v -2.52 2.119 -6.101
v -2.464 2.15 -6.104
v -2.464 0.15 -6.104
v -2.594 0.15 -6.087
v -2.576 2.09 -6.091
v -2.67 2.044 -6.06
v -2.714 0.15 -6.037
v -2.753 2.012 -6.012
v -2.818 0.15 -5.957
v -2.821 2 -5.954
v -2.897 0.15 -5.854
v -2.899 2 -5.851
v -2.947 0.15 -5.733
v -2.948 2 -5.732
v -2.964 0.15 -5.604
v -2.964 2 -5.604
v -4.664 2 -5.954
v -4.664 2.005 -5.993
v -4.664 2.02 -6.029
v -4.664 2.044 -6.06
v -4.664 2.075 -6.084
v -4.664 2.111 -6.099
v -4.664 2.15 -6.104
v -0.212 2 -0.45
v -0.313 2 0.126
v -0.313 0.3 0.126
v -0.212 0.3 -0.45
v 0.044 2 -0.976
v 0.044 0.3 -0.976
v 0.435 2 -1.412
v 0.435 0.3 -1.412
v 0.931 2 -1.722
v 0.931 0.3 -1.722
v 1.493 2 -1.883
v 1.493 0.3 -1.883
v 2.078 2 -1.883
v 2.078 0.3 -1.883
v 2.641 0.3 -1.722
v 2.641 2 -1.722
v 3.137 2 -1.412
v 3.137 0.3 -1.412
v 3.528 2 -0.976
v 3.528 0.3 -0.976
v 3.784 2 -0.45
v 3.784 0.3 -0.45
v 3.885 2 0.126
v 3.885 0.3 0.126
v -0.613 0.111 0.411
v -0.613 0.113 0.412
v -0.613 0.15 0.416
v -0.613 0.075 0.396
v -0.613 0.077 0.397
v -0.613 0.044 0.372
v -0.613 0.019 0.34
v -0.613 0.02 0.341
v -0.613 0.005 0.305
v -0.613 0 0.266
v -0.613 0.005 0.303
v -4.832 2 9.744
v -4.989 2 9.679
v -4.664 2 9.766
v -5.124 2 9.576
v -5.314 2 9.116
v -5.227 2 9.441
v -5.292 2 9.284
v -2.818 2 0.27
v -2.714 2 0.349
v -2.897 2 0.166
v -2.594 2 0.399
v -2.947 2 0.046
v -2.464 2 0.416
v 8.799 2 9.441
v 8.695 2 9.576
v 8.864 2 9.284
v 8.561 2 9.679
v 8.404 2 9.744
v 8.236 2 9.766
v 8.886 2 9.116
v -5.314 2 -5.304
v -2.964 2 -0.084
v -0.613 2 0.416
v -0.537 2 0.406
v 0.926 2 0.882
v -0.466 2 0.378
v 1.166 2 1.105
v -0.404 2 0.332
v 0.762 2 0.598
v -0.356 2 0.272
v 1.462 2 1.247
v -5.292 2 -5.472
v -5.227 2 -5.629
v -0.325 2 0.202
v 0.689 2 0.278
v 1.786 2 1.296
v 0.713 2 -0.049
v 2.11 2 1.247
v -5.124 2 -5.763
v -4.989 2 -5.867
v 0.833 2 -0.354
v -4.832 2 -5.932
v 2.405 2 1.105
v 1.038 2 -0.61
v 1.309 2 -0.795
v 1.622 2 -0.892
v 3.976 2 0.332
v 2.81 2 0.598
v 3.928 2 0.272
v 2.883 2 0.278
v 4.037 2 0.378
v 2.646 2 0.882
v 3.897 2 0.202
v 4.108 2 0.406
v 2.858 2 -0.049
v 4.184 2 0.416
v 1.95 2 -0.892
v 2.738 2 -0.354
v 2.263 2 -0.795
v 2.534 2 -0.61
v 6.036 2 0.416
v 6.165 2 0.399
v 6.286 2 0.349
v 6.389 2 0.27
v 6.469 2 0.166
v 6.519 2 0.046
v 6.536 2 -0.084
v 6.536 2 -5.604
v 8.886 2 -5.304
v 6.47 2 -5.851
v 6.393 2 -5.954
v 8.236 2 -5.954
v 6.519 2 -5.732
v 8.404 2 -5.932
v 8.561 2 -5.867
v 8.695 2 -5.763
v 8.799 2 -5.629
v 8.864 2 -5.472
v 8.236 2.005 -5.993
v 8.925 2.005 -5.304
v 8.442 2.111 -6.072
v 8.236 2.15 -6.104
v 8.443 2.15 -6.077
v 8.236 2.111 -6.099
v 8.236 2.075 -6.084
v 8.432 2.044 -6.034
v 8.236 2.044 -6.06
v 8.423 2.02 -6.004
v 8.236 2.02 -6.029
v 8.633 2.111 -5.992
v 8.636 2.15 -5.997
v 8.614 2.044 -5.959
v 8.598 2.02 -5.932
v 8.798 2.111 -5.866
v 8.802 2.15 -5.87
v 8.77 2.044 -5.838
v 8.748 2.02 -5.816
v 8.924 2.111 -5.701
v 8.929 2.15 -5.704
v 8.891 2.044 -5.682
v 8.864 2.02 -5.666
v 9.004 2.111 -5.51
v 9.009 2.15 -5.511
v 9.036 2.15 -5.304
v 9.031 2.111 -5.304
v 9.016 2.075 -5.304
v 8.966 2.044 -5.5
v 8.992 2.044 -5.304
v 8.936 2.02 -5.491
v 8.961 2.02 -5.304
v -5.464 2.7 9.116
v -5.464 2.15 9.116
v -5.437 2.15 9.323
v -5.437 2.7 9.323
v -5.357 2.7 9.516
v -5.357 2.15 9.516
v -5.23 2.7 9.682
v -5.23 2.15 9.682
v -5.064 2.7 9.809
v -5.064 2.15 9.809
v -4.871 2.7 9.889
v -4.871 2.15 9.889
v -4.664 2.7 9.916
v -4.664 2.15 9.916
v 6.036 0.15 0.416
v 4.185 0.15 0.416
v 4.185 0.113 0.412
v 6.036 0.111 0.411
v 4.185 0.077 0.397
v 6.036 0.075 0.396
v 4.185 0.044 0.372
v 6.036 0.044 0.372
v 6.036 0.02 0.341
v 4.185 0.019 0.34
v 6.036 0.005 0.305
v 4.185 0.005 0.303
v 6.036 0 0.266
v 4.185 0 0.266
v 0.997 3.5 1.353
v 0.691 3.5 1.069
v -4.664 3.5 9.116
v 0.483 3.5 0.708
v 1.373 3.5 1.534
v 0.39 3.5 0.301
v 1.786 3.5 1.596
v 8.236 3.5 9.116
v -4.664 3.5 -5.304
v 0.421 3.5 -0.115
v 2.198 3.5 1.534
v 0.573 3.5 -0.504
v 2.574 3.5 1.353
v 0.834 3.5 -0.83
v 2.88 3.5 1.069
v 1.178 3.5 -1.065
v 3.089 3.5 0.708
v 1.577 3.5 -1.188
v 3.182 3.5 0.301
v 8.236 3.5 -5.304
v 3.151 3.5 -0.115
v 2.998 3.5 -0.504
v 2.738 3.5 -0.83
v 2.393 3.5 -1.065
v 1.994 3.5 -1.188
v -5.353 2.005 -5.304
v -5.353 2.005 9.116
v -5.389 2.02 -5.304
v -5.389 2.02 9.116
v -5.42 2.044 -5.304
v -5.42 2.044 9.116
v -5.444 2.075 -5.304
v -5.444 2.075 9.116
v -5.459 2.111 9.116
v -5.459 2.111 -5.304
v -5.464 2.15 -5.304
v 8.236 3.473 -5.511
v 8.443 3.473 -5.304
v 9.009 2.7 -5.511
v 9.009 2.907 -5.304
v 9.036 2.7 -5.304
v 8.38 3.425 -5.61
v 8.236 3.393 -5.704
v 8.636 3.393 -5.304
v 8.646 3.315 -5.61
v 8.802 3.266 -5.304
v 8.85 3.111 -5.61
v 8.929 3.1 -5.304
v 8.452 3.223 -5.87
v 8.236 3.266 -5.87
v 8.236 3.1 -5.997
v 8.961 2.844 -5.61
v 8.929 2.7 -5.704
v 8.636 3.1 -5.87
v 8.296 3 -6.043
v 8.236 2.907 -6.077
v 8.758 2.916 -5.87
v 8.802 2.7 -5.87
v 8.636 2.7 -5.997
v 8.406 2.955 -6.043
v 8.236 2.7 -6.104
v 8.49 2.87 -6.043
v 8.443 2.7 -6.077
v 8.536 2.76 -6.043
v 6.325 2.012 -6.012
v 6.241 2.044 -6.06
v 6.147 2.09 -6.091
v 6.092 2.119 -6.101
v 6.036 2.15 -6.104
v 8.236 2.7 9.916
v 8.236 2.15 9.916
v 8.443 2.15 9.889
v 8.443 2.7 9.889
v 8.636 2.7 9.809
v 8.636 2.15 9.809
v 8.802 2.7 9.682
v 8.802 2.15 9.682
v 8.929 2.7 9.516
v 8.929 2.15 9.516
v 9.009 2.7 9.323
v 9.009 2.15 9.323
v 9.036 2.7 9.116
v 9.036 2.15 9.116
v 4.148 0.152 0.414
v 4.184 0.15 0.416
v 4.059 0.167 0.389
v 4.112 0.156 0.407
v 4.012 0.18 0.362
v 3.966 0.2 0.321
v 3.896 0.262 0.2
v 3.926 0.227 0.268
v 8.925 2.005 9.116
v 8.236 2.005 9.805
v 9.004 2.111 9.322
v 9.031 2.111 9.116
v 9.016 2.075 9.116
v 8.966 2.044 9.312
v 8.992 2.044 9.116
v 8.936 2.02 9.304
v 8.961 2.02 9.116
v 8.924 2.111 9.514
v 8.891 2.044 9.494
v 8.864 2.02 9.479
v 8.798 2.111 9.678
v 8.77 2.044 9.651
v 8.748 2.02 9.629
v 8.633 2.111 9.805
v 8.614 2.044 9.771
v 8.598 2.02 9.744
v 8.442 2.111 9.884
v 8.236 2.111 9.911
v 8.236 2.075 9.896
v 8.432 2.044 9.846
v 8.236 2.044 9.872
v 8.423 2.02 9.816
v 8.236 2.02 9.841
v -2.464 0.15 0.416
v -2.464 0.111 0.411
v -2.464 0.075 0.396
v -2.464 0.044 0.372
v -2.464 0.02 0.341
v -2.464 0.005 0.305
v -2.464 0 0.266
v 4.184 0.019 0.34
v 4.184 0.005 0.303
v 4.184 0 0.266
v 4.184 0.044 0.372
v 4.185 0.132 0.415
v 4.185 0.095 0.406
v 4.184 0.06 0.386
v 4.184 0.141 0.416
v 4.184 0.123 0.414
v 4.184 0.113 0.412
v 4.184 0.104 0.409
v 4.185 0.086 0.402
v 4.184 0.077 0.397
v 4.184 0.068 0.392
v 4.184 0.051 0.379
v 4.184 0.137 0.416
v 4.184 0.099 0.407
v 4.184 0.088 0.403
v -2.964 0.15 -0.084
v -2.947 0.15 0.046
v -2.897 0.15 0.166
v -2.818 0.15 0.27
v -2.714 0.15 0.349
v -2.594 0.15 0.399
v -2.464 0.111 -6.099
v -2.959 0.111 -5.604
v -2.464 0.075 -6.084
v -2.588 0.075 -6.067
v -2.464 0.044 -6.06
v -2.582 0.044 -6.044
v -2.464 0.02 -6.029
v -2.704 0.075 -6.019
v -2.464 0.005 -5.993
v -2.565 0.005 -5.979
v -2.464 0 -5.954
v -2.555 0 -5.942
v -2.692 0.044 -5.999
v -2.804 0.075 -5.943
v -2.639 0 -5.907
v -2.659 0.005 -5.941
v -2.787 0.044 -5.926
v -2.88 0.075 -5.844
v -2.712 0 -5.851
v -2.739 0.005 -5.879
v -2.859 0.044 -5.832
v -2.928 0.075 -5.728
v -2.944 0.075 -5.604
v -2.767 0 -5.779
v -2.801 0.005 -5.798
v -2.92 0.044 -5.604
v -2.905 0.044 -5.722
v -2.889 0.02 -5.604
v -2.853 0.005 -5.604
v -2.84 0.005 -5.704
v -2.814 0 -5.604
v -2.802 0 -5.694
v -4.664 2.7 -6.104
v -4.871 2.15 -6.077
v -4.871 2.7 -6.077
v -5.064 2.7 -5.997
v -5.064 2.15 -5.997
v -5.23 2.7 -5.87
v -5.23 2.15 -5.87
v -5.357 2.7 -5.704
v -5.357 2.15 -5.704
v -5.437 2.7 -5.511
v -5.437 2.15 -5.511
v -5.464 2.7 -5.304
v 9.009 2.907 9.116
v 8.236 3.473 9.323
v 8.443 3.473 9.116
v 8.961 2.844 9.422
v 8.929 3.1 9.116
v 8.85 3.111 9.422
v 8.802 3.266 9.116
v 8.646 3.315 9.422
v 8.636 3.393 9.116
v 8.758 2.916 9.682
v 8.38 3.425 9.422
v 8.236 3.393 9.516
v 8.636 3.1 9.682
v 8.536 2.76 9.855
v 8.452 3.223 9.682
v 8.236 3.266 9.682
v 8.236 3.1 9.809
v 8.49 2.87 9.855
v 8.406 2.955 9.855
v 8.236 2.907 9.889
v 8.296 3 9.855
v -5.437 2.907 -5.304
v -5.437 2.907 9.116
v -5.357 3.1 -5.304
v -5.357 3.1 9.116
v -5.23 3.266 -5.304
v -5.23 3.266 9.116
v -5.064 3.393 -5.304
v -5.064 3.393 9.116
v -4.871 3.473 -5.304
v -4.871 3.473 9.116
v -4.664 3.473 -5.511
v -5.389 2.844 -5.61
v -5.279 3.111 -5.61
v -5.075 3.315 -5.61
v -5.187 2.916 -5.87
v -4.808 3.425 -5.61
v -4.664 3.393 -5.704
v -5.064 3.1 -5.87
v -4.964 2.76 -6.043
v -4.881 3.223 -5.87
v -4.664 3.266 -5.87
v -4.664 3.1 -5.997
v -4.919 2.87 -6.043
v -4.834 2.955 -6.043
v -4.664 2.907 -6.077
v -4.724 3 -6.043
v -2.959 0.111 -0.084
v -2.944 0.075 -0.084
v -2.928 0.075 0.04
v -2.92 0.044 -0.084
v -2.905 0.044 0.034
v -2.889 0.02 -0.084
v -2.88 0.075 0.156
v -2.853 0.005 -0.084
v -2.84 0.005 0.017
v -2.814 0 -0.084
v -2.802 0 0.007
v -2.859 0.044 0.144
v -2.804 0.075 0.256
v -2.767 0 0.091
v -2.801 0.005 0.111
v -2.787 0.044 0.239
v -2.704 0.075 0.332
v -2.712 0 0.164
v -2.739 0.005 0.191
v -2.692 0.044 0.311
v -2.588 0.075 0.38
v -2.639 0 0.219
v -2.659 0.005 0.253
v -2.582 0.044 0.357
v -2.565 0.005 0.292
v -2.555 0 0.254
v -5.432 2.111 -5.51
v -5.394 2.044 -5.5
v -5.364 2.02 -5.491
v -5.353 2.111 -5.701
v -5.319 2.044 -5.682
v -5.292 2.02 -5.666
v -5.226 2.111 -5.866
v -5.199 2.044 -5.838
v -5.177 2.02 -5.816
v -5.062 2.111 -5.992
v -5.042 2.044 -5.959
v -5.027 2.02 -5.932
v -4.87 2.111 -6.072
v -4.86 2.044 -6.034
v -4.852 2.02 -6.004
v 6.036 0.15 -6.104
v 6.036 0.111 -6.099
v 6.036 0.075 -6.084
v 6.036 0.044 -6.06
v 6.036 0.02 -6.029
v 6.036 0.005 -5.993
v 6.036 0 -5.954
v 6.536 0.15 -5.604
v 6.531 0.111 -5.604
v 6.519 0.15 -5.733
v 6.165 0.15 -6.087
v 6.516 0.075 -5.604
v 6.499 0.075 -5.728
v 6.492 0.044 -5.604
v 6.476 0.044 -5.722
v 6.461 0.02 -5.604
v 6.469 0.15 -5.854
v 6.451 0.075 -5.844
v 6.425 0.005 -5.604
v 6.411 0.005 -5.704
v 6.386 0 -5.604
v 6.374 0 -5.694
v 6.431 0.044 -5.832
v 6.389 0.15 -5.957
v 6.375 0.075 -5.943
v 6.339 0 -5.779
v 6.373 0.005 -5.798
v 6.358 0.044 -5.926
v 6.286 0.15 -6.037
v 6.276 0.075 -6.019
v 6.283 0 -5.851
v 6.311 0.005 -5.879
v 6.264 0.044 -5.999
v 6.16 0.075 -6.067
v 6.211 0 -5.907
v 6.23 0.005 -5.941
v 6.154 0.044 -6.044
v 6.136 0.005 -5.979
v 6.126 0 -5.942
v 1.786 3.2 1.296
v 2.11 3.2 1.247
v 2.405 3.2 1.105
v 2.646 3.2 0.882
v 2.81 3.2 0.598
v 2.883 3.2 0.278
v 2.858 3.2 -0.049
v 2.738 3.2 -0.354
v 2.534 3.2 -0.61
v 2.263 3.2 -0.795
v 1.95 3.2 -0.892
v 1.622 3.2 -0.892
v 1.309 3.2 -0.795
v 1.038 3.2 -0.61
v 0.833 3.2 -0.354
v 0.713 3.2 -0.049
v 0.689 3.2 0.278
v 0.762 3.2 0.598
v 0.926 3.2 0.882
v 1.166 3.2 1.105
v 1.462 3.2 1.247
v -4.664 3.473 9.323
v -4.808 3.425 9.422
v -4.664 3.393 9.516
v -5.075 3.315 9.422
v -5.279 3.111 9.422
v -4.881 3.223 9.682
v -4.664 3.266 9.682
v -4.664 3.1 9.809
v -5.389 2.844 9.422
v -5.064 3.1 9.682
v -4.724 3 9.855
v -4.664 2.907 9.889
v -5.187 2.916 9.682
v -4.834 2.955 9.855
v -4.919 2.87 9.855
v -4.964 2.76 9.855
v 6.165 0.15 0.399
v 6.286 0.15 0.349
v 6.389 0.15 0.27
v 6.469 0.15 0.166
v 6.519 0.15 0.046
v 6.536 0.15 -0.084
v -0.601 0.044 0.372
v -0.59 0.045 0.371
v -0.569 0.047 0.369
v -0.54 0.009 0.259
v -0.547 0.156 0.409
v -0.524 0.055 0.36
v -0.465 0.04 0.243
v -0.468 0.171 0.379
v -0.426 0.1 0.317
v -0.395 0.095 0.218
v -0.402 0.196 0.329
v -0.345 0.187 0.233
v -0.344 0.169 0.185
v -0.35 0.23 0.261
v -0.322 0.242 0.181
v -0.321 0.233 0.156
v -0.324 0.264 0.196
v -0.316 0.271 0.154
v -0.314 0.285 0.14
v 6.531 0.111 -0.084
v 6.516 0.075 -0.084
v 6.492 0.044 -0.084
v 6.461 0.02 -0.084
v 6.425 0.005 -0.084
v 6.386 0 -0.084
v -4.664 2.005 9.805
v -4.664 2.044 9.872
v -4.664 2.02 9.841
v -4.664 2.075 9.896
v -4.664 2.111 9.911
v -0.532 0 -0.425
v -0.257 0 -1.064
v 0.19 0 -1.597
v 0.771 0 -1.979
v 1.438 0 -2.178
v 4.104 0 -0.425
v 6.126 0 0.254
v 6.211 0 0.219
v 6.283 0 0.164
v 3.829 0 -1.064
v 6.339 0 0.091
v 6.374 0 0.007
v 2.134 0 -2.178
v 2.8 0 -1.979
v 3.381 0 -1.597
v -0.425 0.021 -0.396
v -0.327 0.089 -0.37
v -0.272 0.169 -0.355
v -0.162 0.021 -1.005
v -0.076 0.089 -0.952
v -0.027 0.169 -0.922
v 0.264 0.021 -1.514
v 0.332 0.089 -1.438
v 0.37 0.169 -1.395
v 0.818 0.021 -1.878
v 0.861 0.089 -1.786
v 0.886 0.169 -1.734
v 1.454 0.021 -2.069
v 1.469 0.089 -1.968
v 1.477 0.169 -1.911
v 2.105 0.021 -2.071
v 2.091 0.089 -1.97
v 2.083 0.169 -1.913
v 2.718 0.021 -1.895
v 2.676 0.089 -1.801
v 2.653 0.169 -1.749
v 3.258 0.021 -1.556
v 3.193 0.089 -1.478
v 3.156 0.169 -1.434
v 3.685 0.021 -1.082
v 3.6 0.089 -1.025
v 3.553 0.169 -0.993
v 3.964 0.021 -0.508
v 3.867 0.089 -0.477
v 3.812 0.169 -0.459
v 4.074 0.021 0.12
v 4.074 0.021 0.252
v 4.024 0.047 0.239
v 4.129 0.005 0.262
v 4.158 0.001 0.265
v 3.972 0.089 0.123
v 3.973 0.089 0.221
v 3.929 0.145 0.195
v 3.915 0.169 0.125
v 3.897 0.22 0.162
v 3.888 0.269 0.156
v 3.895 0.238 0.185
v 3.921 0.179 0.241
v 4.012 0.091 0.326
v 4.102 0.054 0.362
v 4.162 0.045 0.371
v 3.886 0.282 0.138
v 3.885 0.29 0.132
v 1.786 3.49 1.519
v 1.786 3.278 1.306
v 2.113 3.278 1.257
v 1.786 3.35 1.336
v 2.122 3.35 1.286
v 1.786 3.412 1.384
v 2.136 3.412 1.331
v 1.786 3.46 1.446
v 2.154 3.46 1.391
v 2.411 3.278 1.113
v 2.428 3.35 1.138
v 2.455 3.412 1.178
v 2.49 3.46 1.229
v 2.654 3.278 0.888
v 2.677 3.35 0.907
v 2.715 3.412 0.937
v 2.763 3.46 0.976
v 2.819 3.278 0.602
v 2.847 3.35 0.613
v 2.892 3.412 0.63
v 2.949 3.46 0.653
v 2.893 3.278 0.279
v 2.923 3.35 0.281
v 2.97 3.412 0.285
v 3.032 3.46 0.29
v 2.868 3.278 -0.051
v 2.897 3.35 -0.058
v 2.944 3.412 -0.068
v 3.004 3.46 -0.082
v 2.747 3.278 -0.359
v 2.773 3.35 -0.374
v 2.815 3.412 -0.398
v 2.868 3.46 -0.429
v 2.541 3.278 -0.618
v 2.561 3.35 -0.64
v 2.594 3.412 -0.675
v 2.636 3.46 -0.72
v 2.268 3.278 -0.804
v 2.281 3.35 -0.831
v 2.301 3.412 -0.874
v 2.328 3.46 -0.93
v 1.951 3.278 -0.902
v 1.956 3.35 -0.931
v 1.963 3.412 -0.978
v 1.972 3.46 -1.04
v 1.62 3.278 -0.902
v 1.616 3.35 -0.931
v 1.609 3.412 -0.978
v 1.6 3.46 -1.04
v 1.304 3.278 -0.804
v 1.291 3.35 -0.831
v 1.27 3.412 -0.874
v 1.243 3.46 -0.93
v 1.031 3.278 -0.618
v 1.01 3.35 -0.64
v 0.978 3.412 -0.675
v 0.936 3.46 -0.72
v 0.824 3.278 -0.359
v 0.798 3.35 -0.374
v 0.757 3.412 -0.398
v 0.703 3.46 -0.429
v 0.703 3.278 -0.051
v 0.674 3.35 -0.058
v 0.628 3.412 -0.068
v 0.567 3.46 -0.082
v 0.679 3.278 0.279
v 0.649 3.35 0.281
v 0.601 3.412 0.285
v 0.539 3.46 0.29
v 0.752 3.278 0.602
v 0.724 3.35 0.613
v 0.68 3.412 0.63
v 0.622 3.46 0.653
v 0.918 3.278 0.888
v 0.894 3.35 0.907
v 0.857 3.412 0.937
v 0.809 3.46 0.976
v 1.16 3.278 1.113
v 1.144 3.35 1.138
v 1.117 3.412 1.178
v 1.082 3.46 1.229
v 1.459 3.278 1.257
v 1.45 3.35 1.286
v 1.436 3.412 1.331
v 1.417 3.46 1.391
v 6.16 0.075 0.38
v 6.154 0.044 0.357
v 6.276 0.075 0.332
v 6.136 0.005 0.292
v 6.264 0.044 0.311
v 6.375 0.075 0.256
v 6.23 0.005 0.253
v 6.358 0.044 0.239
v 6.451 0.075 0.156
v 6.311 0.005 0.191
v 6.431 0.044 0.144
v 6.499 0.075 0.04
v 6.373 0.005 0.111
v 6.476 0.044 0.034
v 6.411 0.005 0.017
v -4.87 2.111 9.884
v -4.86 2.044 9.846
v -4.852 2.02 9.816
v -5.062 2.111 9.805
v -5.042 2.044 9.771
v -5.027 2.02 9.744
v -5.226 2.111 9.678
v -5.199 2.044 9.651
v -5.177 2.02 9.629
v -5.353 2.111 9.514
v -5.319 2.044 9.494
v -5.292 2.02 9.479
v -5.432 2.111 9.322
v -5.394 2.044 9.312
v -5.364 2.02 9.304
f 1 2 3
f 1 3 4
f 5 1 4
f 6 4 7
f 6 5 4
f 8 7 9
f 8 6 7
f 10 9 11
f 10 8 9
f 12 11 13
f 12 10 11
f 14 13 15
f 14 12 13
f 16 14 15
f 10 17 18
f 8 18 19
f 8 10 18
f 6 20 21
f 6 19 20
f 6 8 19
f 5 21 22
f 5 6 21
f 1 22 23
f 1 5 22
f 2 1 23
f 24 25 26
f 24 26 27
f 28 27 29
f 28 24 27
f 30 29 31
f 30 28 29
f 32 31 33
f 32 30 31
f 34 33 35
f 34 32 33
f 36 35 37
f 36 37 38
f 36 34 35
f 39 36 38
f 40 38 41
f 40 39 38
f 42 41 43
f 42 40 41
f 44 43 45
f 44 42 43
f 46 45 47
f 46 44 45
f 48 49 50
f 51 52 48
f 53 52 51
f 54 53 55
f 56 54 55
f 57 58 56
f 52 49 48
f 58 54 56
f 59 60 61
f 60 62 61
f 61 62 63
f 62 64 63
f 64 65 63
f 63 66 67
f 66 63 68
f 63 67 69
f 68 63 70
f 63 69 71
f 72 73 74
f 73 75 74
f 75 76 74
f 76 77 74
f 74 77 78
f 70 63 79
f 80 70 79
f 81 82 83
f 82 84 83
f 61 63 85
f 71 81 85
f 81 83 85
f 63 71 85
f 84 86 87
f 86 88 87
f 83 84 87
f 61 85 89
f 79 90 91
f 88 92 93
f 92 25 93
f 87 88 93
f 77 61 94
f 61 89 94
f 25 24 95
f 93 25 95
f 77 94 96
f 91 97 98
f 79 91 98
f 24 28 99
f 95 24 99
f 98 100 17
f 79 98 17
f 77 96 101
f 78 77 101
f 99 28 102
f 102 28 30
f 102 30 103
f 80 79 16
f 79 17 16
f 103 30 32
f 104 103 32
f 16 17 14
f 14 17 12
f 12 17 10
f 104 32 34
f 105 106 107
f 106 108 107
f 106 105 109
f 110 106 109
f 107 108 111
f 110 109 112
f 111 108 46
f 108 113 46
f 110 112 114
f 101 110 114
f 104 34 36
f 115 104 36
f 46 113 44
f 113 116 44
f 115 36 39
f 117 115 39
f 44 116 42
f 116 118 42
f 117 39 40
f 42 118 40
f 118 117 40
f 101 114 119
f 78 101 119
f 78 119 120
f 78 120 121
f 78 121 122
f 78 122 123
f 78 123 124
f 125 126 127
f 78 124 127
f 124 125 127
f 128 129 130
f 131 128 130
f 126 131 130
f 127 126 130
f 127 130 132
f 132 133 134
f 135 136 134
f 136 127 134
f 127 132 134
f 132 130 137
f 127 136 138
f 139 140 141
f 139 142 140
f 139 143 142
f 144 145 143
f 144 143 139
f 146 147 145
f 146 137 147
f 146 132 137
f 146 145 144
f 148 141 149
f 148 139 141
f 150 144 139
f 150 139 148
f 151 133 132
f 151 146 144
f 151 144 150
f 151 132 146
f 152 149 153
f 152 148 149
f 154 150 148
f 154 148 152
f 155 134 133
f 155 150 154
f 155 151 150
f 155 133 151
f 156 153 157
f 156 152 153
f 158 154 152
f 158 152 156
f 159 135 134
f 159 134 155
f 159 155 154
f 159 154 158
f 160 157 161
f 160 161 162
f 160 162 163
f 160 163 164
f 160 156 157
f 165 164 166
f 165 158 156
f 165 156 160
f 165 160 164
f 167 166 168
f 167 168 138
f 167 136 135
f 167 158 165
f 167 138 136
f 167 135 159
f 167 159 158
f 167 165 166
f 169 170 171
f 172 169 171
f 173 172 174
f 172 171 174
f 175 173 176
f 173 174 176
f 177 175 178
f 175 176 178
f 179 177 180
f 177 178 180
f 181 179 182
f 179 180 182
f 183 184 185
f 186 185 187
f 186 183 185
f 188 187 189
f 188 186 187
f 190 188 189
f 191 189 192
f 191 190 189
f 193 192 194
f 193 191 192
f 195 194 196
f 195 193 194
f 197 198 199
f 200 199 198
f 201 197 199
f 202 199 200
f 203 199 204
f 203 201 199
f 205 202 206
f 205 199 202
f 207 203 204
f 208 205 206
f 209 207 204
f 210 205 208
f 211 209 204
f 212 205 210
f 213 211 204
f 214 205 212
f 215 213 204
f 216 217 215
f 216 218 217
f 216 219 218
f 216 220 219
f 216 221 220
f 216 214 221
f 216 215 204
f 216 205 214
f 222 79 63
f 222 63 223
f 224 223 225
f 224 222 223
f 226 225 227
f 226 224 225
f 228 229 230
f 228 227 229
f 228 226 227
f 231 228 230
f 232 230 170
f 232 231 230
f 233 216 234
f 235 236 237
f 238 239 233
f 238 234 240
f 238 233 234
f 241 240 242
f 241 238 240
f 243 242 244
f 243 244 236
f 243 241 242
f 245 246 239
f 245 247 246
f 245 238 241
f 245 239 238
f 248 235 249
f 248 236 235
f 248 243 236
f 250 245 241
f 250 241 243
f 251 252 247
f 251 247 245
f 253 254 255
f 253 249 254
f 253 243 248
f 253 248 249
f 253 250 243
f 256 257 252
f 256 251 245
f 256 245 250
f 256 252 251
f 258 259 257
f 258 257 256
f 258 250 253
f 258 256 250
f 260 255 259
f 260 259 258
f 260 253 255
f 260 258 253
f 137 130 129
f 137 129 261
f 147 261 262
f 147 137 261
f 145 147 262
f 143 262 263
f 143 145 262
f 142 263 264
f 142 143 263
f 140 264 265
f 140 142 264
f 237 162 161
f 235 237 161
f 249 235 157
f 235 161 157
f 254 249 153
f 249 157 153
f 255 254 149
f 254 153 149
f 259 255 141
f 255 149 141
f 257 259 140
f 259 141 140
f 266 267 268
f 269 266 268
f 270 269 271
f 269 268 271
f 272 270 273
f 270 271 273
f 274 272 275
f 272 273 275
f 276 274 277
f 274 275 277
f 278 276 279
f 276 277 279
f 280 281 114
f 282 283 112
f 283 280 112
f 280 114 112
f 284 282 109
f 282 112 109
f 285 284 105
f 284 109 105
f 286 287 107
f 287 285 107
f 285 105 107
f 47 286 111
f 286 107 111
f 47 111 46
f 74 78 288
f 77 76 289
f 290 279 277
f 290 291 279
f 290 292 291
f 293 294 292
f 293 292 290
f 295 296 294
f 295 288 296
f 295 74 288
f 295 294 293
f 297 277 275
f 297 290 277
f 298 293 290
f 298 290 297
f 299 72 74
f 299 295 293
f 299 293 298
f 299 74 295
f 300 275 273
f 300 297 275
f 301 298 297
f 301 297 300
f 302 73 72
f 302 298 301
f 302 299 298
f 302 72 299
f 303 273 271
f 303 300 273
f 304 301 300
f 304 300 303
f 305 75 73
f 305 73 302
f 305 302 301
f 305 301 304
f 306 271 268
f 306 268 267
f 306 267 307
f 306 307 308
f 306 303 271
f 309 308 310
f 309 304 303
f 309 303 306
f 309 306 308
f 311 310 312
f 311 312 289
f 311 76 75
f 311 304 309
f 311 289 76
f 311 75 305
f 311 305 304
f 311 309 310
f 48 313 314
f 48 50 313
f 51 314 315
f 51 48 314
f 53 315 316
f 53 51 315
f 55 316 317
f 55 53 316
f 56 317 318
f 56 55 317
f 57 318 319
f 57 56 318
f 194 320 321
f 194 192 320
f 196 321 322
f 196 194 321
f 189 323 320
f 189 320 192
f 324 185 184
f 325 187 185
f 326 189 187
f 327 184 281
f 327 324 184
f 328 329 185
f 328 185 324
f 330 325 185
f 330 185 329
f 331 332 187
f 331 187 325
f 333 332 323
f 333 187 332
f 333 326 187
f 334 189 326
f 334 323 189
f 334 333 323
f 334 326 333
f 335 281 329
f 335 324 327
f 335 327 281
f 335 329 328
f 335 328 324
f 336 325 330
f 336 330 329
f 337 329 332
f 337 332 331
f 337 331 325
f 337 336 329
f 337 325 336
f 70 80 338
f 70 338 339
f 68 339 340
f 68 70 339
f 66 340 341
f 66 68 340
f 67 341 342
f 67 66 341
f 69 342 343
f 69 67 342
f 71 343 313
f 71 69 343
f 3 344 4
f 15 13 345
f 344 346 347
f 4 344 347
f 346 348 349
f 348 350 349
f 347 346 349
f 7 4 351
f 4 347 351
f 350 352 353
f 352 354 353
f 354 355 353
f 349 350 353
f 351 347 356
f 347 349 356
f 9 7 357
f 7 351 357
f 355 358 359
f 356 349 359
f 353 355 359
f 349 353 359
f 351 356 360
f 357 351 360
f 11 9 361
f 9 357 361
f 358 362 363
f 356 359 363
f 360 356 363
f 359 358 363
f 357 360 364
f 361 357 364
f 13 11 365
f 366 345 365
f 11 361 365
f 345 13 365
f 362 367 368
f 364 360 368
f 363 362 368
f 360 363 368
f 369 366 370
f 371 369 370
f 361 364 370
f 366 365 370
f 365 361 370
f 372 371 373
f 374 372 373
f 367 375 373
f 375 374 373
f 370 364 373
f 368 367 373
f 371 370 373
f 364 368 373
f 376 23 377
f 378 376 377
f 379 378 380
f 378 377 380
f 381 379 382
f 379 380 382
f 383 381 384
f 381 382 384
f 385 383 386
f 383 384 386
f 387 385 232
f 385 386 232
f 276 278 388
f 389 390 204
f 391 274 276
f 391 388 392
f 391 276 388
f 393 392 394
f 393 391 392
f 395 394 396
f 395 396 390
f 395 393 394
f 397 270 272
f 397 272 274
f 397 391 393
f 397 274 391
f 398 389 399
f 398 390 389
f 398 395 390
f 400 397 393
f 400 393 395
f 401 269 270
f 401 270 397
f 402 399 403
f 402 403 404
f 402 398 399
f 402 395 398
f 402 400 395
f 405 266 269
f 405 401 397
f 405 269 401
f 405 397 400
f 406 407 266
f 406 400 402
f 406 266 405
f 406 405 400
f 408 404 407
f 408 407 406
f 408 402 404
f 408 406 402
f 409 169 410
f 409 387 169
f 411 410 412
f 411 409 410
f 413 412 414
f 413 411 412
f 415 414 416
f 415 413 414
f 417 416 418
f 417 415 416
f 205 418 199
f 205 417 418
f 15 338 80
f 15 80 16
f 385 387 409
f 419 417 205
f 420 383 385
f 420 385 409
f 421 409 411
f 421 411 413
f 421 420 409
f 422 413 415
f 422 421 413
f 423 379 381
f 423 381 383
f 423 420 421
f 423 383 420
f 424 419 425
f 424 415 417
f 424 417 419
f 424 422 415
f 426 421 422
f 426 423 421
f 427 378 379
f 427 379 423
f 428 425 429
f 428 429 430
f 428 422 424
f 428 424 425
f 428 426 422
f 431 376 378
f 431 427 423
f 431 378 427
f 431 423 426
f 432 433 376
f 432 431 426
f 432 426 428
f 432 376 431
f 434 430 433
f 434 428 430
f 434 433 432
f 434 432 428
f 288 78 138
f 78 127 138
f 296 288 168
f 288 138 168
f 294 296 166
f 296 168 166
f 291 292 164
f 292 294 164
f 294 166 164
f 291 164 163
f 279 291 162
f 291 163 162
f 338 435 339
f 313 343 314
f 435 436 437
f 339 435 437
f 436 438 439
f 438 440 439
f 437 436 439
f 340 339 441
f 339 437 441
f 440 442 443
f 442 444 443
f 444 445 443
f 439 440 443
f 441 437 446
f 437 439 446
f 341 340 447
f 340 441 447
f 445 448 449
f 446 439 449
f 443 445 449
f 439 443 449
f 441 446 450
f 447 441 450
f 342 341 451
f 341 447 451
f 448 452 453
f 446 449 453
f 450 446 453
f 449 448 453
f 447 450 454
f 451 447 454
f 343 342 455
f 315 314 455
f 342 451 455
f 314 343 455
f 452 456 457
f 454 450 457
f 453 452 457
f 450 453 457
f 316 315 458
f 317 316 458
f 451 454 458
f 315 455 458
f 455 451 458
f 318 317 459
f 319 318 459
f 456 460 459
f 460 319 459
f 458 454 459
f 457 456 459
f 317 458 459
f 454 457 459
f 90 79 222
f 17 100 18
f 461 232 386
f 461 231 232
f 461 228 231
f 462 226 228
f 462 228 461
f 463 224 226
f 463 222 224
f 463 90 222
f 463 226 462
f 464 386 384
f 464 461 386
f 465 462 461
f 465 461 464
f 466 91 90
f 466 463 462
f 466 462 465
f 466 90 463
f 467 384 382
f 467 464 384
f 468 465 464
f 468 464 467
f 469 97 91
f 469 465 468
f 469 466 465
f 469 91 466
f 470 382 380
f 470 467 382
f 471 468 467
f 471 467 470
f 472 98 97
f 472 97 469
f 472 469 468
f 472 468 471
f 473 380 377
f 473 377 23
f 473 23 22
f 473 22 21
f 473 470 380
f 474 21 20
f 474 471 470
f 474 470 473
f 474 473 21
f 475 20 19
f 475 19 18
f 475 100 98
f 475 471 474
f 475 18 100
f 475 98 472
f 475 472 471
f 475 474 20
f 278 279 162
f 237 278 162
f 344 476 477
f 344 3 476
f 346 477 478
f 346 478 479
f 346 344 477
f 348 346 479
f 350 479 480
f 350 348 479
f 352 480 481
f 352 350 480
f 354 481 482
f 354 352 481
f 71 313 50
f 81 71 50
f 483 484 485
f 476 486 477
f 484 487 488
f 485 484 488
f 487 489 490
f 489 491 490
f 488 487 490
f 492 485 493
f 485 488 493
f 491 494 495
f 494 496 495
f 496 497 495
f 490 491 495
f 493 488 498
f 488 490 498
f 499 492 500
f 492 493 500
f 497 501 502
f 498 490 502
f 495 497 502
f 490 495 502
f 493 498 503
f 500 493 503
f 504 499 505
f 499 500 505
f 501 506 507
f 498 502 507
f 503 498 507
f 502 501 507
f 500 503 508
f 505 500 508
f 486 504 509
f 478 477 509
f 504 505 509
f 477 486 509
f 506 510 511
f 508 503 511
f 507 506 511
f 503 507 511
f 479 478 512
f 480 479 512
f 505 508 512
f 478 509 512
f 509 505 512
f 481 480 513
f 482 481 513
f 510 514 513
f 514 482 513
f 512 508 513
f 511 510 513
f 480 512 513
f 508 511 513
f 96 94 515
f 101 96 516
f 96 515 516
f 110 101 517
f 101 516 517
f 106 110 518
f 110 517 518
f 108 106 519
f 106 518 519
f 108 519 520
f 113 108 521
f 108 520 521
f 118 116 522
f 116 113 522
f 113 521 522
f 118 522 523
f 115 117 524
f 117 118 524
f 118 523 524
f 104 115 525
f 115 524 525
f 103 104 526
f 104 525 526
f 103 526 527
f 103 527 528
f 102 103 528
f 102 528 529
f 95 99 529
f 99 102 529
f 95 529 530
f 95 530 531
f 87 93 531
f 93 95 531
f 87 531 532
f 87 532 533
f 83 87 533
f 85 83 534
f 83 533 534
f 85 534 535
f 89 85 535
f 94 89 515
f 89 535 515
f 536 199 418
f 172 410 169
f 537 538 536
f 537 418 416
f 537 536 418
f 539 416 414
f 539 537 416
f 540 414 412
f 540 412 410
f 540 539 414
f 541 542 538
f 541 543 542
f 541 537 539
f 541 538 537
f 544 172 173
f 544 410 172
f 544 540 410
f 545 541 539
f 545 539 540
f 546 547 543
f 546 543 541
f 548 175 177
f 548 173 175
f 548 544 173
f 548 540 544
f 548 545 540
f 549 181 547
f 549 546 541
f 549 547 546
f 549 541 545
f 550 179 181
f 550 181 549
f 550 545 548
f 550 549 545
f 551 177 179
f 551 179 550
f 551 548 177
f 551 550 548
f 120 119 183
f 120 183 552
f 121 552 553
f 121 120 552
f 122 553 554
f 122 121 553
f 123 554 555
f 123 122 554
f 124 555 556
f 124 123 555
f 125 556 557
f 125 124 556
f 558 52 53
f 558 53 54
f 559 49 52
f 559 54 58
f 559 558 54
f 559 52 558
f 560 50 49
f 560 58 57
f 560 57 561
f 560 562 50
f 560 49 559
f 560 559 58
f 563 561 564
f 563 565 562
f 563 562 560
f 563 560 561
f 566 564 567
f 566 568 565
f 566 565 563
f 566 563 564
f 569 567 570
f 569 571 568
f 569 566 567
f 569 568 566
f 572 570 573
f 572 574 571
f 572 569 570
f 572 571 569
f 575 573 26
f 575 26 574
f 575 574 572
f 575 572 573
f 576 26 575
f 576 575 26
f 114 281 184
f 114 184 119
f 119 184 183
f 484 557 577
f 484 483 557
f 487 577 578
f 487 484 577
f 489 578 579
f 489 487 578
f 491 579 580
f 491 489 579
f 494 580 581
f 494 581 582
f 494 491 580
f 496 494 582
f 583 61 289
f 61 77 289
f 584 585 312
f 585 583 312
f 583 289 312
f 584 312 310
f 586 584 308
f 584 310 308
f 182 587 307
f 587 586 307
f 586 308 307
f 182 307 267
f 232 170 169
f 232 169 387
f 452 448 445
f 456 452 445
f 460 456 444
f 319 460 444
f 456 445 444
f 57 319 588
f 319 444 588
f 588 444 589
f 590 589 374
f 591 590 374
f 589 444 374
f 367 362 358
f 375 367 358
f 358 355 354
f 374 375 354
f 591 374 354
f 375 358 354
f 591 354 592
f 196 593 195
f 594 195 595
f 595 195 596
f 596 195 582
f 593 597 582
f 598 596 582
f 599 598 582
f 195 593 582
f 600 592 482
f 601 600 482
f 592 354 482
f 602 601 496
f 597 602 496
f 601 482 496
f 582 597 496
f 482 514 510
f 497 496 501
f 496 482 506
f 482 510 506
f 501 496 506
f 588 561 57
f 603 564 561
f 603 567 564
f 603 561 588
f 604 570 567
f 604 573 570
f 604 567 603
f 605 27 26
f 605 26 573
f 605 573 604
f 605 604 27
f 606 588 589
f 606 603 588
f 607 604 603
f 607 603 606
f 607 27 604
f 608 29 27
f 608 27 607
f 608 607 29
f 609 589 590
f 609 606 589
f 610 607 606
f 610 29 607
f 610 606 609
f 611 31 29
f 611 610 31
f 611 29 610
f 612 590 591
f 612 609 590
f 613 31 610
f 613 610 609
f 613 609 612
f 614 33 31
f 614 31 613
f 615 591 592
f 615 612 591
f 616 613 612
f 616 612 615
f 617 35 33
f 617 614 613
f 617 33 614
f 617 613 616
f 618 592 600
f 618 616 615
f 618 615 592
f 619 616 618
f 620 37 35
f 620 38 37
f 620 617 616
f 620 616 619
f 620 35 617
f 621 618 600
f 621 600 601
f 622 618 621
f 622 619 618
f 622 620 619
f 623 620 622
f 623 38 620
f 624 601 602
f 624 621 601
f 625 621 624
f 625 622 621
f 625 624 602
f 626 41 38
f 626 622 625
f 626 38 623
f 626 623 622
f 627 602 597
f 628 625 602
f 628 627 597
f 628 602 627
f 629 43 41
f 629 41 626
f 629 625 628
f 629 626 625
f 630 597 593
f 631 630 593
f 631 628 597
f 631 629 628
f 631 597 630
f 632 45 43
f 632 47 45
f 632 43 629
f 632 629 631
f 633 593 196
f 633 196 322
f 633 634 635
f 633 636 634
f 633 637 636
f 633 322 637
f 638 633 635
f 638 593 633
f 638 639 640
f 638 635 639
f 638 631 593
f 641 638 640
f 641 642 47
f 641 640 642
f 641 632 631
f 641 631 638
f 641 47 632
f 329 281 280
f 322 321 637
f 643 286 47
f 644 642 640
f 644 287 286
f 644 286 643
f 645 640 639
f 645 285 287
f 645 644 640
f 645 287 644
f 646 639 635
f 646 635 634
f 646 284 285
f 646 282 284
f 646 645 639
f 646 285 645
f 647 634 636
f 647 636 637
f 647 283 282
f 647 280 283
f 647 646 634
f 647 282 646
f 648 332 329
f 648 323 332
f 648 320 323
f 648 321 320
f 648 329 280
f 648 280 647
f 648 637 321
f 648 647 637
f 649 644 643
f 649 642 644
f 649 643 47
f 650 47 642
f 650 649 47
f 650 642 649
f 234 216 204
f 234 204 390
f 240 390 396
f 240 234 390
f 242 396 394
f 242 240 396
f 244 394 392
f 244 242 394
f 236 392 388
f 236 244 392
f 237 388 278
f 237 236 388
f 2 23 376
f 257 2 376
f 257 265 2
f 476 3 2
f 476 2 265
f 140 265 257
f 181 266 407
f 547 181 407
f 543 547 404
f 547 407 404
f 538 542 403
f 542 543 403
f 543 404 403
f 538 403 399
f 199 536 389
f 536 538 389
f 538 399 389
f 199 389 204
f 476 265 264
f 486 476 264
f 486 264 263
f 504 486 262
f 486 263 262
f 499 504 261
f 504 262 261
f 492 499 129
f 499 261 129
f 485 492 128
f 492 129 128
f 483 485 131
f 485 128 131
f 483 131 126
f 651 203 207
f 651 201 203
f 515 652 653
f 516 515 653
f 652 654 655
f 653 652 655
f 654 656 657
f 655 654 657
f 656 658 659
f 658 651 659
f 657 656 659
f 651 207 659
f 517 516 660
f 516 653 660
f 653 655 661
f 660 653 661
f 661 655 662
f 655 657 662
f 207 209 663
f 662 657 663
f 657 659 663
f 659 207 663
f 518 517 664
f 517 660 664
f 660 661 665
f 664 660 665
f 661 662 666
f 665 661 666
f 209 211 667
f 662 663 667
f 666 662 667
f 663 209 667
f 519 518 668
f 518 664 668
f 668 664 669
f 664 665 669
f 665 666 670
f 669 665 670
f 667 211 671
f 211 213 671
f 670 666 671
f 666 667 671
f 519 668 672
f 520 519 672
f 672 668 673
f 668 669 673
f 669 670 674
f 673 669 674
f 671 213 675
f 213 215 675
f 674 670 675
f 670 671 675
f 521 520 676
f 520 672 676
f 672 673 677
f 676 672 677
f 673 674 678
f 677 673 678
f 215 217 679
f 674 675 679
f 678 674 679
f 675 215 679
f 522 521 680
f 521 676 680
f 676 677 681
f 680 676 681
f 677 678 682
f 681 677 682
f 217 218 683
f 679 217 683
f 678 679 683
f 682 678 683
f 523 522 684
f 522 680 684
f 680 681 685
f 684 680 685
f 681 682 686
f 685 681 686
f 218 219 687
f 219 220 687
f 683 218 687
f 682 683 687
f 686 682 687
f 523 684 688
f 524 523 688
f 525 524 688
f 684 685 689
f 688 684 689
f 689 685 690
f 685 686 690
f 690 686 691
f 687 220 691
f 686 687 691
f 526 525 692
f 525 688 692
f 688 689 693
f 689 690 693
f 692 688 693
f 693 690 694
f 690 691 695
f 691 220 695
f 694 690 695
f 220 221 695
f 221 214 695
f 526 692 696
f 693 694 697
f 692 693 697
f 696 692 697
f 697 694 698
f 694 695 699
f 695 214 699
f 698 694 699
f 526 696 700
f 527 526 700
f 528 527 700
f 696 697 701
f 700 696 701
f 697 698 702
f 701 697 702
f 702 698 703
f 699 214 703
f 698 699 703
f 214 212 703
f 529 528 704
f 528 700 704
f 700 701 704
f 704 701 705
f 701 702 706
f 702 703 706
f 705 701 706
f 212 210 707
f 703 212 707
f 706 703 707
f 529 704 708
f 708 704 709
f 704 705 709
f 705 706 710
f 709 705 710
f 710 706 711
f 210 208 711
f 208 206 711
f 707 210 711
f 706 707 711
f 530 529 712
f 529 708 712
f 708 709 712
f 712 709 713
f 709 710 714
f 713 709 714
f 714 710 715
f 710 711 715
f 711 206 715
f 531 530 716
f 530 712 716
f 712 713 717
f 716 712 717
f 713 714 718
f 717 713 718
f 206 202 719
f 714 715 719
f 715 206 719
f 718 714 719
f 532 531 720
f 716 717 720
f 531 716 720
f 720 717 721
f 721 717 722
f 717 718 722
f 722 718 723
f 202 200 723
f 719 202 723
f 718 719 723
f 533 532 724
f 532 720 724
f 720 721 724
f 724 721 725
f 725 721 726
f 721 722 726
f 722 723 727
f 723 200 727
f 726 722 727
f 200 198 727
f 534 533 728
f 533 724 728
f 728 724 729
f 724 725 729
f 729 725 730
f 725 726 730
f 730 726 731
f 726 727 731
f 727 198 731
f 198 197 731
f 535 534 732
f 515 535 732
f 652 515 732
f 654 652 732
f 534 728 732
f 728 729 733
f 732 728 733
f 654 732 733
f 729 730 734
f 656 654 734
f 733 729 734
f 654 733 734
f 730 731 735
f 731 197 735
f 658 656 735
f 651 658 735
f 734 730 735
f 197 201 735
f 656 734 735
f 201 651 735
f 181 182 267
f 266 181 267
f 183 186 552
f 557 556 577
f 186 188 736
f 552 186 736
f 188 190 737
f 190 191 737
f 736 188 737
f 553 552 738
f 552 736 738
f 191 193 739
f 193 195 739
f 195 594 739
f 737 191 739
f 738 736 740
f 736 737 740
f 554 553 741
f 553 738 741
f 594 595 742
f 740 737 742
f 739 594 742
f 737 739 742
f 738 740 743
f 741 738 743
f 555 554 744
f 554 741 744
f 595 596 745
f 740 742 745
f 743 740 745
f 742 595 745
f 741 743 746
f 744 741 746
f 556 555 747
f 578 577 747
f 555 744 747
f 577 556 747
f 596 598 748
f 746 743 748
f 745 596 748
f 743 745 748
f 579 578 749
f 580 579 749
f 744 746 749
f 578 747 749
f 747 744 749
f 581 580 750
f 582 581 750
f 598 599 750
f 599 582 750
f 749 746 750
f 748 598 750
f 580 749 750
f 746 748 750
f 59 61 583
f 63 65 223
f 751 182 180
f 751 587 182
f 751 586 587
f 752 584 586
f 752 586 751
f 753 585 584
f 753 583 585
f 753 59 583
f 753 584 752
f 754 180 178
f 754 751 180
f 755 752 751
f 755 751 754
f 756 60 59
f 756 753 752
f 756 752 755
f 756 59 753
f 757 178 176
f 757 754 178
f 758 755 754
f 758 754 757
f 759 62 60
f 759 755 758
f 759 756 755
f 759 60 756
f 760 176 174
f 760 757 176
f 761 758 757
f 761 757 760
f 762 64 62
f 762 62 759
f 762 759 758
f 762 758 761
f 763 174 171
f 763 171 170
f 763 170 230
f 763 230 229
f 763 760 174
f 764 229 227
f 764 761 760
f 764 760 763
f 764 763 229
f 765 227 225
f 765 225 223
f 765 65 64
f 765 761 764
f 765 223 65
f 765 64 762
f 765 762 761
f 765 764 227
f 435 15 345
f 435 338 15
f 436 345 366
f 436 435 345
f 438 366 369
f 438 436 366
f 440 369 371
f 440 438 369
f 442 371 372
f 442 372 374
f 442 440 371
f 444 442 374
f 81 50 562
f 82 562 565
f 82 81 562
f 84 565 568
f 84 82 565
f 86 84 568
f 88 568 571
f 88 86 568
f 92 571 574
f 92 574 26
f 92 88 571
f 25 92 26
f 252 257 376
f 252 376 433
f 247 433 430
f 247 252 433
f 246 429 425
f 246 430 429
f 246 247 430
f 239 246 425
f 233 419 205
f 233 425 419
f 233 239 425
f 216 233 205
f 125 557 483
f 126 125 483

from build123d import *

# Parameters (mm, degrees)
SKETCH_1_W          = 9.5
SKETCH_1_H          = 6.52
EXTRUDE_1_DEPTH     = 2
SKETCH_2_W          = 14.5
SKETCH_2_H          = 16.02
EXTRUDE_2_DEPTH     = 1.5
SKETCH_3_R          = 1.1
CUT_EXTRUDE_1_DEPTH = 14.864587318
FILLET_3_R          = 0.8
FILLET_4_R          = 0.5
FILLET_7_R          = 0.15
FILLET_8_R          = 0.8
FILLET_10_R         = 0.3
SKETCH_4_R          = 2.1
CUT_EXTRUDE_2_DEPTH = 14.563804108
FILLET_11_R         = 0.3
FILLET_12_R         = 0.15


with BuildPart() as part:
    # Эскиз1 → Бобышка-Вытянуть1 (new body)
    with BuildSketch(Plane(origin=(0, 0, 0), x_dir=(1, 0, 0), z_dir=(0, 1, 0))):
        with Locations((1.785821709, 2.843815878)):
            Rectangle(SKETCH_1_W, SKETCH_1_H)
    extrude(amount=EXTRUDE_1_DEPTH)

    # Эскиз2 → Бобышка-Вытянуть2 (add)
    with BuildSketch(Plane(origin=(0, 2, 0), x_dir=(1, 0, 0), z_dir=(0, 1, 0))):
        with Locations((1.785821709, -1.906184122)):
            Rectangle(SKETCH_2_W, SKETCH_2_H)
    extrude(amount=EXTRUDE_2_DEPTH)

    # Эскиз3 → Вырез-Вытянуть1 (cut, through all)
    with BuildSketch(Plane(origin=(0, 3.5, 0), x_dir=(1, 0, 0), z_dir=(0, 1, 0))):
        with Locations(Location((1.785821709, -0.196184122, 0), (0, 0, 270))):
            Circle(SKETCH_3_R)
    extrude(amount=-CUT_EXTRUDE_1_DEPTH, mode=Mode.SUBTRACT)

    # Скругление3
    fillet_3_edges = [part.edges().sort_by_distance(p)[0] for p in [
        (-5.464178291, 3.5, 1.906184122),
        (1.785821709, 3.5, 9.916184122),
        (9.035821709, 3.5, 1.906184122),
        (1.785821709, 3.5, -6.103815878),
    ]]
    fillet(fillet_3_edges, radius=FILLET_3_R)

    # Скругление4
    fillet_4_edges = [part.edges().sort_by_distance(p)[0] for p in [
        (-2.964178291, 1, -6.103815878),
        (6.535821709, 1, -6.103815878),
        (6.535821709, 1, 0.416184122),
        (-2.964178291, 1, 0.416184122),
    ]]
    fillet(fillet_4_edges, radius=FILLET_4_R)

    # Скругление7
    fillet_7_edges = [part.edges().sort_by_distance(p)[0] for p in [
        (-5.464178291, 2, 1.906184122),
        (1.785821709, 2, 9.916184122),
        (9.035821709, 2, 1.906184122),
        (7.535821709, 2, -6.103815878),
        (-3.964178291, 2, -6.103815878),
    ]]
    fillet(fillet_7_edges, radius=FILLET_7_R)

    # Скругление8
    # the kernel refuses this fillet: 0.8 mm, written as the material it takes off along each edge
    with BuildSketch(Plane(origin=(-4.664178291, 2, -5.303815878), x_dir=(-1, 0, 0), z_dir=(0, 0, 1))) as fillet_8_piece_1:
        with BuildLine():
            CenterArc((0.65, -0.15), 0.15, 0, 90)
            Line((0.8, -0.15), (0.8, 0))
            Line((0.8, 0), (0.65, 0))
        make_face()
    revolve(axis=Axis((-4.664178291, 2, -5.303815878), (0, -1, 0)), revolution_arc=90, mode=Mode.SUBTRACT)
    with BuildSketch(Plane(origin=(-4.664178291, 2, 9.116184122), x_dir=(0, 0, 1), z_dir=(1, 0, 0))) as fillet_8_piece_2:
        with BuildLine():
            CenterArc((0.65, -0.15), 0.15, 0, 90)
            Line((0.8, -0.15), (0.8, 0))
            Line((0.8, 0), (0.65, 0))
        make_face()
    revolve(axis=Axis((-4.664178291, 2, 9.116184122), (0, -1, 0)), revolution_arc=90, mode=Mode.SUBTRACT)
    with BuildSketch(Plane(origin=(8.235821709, 2, 9.116184122), x_dir=(1, 0, 0), z_dir=(0, 0, -1))) as fillet_8_piece_3:
        with BuildLine():
            CenterArc((0.65, -0.15), 0.15, 0, 90)
            Line((0.8, -0.15), (0.8, 0))
            Line((0.8, 0), (0.65, 0))
        make_face()
    revolve(axis=Axis((8.235821709, 2, 9.116184122), (0, -1, 0)), revolution_arc=90, mode=Mode.SUBTRACT)
    with BuildSketch(Plane(origin=(8.235821709, 2, -5.303815878), x_dir=(0, 0, -1), z_dir=(-1, 0, 0))) as fillet_8_piece_4:
        with BuildLine():
            CenterArc((0.65, -0.15), 0.15, 0, 90)
            Line((0.8, -0.15), (0.8, 0))
            Line((0.8, 0), (0.65, 0))
        make_face()
    revolve(axis=Axis((8.235821709, 2, -5.303815878), (0, -1, 0)), revolution_arc=90, mode=Mode.SUBTRACT)
    with BuildSketch(Plane(origin=(8.235821709, 2.7, 9.116184122), x_dir=(1, 0, 0), z_dir=(0, 0, 1))) as fillet_8_piece_5_section:
        Polygon((0, 0), (FILLET_8_R, 0), (FILLET_8_R, FILLET_8_R), (0, FILLET_8_R), align=None)
    fillet_8_piece_5 = extrude(amount=FILLET_8_R, mode=Mode.PRIVATE)
    fillet_8_piece_5 = fillet_8_piece_5 - Plane(origin=(8.235821709, 2.7, 9.116184122), x_dir=(-0.7071067811865475, -0.7071067811865475, 0), z_dir=(0, 0, 1)) * Sphere(FILLET_8_R, mode=Mode.PRIVATE)
    add(fillet_8_piece_5, mode=Mode.SUBTRACT)
    with BuildSketch(Plane(origin=(-4.664178291, 2.7, 9.116184122), x_dir=(-1, 0, 0), z_dir=(0, 0, 1))) as fillet_8_piece_6_section:
        Polygon((0, 0), (FILLET_8_R, 0), (FILLET_8_R, -FILLET_8_R), (0, -FILLET_8_R), align=None)
    fillet_8_piece_6 = extrude(amount=FILLET_8_R, mode=Mode.PRIVATE)
    fillet_8_piece_6 = fillet_8_piece_6 - Plane(origin=(-4.664178291, 2.7, 9.116184122), x_dir=(0.7071067811865475, -0.7071067811865475, 0), z_dir=(0, 0, 1)) * Sphere(FILLET_8_R, mode=Mode.PRIVATE)
    add(fillet_8_piece_6, mode=Mode.SUBTRACT)
    with BuildSketch(Plane(origin=(8.235821709, 2.7, -5.303815878), x_dir=(1, 0, 0), z_dir=(0, 0, -1))) as fillet_8_piece_7_section:
        Polygon((0, 0), (FILLET_8_R, 0), (FILLET_8_R, -FILLET_8_R), (0, -FILLET_8_R), align=None)
    fillet_8_piece_7 = extrude(amount=FILLET_8_R, mode=Mode.PRIVATE)
    fillet_8_piece_7 = fillet_8_piece_7 - Plane(origin=(8.235821709, 2.7, -5.303815878), x_dir=(-0.7071067811865475, -0.7071067811865475, 0), z_dir=(0, 0, -1)) * Sphere(FILLET_8_R, mode=Mode.PRIVATE)
    add(fillet_8_piece_7, mode=Mode.SUBTRACT)
    with BuildSketch(Plane(origin=(-4.664178291, 2.7, -5.303815878), x_dir=(-1, 0, 0), z_dir=(0, 0, -1))) as fillet_8_piece_8_section:
        Polygon((0, 0), (FILLET_8_R, 0), (FILLET_8_R, FILLET_8_R), (0, FILLET_8_R), align=None)
    fillet_8_piece_8 = extrude(amount=FILLET_8_R, mode=Mode.PRIVATE)
    fillet_8_piece_8 = fillet_8_piece_8 - Plane(origin=(-4.664178291, 2.7, -5.303815878), x_dir=(0.7071067811865475, -0.7071067811865475, 0), z_dir=(0, 0, -1)) * Sphere(FILLET_8_R, mode=Mode.PRIVATE)
    add(fillet_8_piece_8, mode=Mode.SUBTRACT)
    with BuildSketch(Plane(origin=(-5.464178291, 2, -6.103815878), x_dir=(1, 0, 0), z_dir=(0, 1, 0)), Plane(origin=(9.035821709, 2, 9.916184122), x_dir=(-1, 0, 0), z_dir=(0, 1, 0))) as fillet_8_piece_9:
        with BuildLine():
            CenterArc((FILLET_8_R, -FILLET_8_R), FILLET_8_R, 90, 90)
            Line((0, -FILLET_8_R), (0, 0))
            Line((0, 0), (FILLET_8_R, 0))
        make_face()
    extrude(amount=0.7, mode=Mode.SUBTRACT)
    with BuildSketch(Plane(origin=(9.035821709, 2, -6.103815878), x_dir=(-1, 0, 0), z_dir=(0, 1, 0)), Plane(origin=(-5.464178291, 2, 9.916184122), x_dir=(1, 0, 0), z_dir=(0, 1, 0))) as fillet_8_piece_10:
        with BuildLine():
            CenterArc((FILLET_8_R, FILLET_8_R), FILLET_8_R, 180, 90)
            Line((0, FILLET_8_R), (0, 0))
            Line((0, 0), (FILLET_8_R, 0))
        make_face()
    extrude(amount=0.7, mode=Mode.SUBTRACT)

    # Скругление10
    fillet_10_edges = [part.edges().sort_by_distance(p)[0] for p in [
        (1.785821709, 3.5, -0.903815878),
    ]]
    fillet(fillet_10_edges, radius=FILLET_10_R)

    # Эскиз4 → Вырез-Вытянуть2 (cut, through all)
    with BuildSketch(Plane.XZ.offset(-2)):
        with Locations((1.785821709, 0.196184122)):
            Circle(SKETCH_4_R)
    extrude(amount=CUT_EXTRUDE_2_DEPTH, mode=Mode.SUBTRACT)

    # Скругление11
    fillet_11_edges = [part.edges().sort_by_distance(p)[0] for p in [
        (1.785821709, 0, -1.903815878),
        (-0.302622688, 1, 0.416184122),
        (3.874266106, 1, 0.416184122),
    ]]
    fillet(fillet_11_edges, radius=FILLET_11_R)

    # Скругление12
    fillet_12_edges = [part.edges().sort_by_distance(p)[0] for p in [
        (5.110154857, 0, 0.416184122),
        (-0.608464555, 0, 0.416152145),
        (4.180107973, 0, 0.416152145),
        (-0.383168508, 0.105102909, 0.309183864),
        (3.954811922, 0.10510291, 0.309183857),
        (-1.538511439, 0, 0.416184122),
        (-2.964178291, 0, -2.843815878),
        (1.785821709, 0, -6.103815878),
        (6.535821709, 0, -2.843815878),
        (-2.817731681, 0, -5.957369269),
        (6.3893751, 0, -5.957369269),
        (6.3893751, 0, 0.269737512),
        (-2.817731681, 0, 0.269737512),
    ]]
    fillet(fillet_12_edges, radius=FILLET_12_R)


solid = part.part
